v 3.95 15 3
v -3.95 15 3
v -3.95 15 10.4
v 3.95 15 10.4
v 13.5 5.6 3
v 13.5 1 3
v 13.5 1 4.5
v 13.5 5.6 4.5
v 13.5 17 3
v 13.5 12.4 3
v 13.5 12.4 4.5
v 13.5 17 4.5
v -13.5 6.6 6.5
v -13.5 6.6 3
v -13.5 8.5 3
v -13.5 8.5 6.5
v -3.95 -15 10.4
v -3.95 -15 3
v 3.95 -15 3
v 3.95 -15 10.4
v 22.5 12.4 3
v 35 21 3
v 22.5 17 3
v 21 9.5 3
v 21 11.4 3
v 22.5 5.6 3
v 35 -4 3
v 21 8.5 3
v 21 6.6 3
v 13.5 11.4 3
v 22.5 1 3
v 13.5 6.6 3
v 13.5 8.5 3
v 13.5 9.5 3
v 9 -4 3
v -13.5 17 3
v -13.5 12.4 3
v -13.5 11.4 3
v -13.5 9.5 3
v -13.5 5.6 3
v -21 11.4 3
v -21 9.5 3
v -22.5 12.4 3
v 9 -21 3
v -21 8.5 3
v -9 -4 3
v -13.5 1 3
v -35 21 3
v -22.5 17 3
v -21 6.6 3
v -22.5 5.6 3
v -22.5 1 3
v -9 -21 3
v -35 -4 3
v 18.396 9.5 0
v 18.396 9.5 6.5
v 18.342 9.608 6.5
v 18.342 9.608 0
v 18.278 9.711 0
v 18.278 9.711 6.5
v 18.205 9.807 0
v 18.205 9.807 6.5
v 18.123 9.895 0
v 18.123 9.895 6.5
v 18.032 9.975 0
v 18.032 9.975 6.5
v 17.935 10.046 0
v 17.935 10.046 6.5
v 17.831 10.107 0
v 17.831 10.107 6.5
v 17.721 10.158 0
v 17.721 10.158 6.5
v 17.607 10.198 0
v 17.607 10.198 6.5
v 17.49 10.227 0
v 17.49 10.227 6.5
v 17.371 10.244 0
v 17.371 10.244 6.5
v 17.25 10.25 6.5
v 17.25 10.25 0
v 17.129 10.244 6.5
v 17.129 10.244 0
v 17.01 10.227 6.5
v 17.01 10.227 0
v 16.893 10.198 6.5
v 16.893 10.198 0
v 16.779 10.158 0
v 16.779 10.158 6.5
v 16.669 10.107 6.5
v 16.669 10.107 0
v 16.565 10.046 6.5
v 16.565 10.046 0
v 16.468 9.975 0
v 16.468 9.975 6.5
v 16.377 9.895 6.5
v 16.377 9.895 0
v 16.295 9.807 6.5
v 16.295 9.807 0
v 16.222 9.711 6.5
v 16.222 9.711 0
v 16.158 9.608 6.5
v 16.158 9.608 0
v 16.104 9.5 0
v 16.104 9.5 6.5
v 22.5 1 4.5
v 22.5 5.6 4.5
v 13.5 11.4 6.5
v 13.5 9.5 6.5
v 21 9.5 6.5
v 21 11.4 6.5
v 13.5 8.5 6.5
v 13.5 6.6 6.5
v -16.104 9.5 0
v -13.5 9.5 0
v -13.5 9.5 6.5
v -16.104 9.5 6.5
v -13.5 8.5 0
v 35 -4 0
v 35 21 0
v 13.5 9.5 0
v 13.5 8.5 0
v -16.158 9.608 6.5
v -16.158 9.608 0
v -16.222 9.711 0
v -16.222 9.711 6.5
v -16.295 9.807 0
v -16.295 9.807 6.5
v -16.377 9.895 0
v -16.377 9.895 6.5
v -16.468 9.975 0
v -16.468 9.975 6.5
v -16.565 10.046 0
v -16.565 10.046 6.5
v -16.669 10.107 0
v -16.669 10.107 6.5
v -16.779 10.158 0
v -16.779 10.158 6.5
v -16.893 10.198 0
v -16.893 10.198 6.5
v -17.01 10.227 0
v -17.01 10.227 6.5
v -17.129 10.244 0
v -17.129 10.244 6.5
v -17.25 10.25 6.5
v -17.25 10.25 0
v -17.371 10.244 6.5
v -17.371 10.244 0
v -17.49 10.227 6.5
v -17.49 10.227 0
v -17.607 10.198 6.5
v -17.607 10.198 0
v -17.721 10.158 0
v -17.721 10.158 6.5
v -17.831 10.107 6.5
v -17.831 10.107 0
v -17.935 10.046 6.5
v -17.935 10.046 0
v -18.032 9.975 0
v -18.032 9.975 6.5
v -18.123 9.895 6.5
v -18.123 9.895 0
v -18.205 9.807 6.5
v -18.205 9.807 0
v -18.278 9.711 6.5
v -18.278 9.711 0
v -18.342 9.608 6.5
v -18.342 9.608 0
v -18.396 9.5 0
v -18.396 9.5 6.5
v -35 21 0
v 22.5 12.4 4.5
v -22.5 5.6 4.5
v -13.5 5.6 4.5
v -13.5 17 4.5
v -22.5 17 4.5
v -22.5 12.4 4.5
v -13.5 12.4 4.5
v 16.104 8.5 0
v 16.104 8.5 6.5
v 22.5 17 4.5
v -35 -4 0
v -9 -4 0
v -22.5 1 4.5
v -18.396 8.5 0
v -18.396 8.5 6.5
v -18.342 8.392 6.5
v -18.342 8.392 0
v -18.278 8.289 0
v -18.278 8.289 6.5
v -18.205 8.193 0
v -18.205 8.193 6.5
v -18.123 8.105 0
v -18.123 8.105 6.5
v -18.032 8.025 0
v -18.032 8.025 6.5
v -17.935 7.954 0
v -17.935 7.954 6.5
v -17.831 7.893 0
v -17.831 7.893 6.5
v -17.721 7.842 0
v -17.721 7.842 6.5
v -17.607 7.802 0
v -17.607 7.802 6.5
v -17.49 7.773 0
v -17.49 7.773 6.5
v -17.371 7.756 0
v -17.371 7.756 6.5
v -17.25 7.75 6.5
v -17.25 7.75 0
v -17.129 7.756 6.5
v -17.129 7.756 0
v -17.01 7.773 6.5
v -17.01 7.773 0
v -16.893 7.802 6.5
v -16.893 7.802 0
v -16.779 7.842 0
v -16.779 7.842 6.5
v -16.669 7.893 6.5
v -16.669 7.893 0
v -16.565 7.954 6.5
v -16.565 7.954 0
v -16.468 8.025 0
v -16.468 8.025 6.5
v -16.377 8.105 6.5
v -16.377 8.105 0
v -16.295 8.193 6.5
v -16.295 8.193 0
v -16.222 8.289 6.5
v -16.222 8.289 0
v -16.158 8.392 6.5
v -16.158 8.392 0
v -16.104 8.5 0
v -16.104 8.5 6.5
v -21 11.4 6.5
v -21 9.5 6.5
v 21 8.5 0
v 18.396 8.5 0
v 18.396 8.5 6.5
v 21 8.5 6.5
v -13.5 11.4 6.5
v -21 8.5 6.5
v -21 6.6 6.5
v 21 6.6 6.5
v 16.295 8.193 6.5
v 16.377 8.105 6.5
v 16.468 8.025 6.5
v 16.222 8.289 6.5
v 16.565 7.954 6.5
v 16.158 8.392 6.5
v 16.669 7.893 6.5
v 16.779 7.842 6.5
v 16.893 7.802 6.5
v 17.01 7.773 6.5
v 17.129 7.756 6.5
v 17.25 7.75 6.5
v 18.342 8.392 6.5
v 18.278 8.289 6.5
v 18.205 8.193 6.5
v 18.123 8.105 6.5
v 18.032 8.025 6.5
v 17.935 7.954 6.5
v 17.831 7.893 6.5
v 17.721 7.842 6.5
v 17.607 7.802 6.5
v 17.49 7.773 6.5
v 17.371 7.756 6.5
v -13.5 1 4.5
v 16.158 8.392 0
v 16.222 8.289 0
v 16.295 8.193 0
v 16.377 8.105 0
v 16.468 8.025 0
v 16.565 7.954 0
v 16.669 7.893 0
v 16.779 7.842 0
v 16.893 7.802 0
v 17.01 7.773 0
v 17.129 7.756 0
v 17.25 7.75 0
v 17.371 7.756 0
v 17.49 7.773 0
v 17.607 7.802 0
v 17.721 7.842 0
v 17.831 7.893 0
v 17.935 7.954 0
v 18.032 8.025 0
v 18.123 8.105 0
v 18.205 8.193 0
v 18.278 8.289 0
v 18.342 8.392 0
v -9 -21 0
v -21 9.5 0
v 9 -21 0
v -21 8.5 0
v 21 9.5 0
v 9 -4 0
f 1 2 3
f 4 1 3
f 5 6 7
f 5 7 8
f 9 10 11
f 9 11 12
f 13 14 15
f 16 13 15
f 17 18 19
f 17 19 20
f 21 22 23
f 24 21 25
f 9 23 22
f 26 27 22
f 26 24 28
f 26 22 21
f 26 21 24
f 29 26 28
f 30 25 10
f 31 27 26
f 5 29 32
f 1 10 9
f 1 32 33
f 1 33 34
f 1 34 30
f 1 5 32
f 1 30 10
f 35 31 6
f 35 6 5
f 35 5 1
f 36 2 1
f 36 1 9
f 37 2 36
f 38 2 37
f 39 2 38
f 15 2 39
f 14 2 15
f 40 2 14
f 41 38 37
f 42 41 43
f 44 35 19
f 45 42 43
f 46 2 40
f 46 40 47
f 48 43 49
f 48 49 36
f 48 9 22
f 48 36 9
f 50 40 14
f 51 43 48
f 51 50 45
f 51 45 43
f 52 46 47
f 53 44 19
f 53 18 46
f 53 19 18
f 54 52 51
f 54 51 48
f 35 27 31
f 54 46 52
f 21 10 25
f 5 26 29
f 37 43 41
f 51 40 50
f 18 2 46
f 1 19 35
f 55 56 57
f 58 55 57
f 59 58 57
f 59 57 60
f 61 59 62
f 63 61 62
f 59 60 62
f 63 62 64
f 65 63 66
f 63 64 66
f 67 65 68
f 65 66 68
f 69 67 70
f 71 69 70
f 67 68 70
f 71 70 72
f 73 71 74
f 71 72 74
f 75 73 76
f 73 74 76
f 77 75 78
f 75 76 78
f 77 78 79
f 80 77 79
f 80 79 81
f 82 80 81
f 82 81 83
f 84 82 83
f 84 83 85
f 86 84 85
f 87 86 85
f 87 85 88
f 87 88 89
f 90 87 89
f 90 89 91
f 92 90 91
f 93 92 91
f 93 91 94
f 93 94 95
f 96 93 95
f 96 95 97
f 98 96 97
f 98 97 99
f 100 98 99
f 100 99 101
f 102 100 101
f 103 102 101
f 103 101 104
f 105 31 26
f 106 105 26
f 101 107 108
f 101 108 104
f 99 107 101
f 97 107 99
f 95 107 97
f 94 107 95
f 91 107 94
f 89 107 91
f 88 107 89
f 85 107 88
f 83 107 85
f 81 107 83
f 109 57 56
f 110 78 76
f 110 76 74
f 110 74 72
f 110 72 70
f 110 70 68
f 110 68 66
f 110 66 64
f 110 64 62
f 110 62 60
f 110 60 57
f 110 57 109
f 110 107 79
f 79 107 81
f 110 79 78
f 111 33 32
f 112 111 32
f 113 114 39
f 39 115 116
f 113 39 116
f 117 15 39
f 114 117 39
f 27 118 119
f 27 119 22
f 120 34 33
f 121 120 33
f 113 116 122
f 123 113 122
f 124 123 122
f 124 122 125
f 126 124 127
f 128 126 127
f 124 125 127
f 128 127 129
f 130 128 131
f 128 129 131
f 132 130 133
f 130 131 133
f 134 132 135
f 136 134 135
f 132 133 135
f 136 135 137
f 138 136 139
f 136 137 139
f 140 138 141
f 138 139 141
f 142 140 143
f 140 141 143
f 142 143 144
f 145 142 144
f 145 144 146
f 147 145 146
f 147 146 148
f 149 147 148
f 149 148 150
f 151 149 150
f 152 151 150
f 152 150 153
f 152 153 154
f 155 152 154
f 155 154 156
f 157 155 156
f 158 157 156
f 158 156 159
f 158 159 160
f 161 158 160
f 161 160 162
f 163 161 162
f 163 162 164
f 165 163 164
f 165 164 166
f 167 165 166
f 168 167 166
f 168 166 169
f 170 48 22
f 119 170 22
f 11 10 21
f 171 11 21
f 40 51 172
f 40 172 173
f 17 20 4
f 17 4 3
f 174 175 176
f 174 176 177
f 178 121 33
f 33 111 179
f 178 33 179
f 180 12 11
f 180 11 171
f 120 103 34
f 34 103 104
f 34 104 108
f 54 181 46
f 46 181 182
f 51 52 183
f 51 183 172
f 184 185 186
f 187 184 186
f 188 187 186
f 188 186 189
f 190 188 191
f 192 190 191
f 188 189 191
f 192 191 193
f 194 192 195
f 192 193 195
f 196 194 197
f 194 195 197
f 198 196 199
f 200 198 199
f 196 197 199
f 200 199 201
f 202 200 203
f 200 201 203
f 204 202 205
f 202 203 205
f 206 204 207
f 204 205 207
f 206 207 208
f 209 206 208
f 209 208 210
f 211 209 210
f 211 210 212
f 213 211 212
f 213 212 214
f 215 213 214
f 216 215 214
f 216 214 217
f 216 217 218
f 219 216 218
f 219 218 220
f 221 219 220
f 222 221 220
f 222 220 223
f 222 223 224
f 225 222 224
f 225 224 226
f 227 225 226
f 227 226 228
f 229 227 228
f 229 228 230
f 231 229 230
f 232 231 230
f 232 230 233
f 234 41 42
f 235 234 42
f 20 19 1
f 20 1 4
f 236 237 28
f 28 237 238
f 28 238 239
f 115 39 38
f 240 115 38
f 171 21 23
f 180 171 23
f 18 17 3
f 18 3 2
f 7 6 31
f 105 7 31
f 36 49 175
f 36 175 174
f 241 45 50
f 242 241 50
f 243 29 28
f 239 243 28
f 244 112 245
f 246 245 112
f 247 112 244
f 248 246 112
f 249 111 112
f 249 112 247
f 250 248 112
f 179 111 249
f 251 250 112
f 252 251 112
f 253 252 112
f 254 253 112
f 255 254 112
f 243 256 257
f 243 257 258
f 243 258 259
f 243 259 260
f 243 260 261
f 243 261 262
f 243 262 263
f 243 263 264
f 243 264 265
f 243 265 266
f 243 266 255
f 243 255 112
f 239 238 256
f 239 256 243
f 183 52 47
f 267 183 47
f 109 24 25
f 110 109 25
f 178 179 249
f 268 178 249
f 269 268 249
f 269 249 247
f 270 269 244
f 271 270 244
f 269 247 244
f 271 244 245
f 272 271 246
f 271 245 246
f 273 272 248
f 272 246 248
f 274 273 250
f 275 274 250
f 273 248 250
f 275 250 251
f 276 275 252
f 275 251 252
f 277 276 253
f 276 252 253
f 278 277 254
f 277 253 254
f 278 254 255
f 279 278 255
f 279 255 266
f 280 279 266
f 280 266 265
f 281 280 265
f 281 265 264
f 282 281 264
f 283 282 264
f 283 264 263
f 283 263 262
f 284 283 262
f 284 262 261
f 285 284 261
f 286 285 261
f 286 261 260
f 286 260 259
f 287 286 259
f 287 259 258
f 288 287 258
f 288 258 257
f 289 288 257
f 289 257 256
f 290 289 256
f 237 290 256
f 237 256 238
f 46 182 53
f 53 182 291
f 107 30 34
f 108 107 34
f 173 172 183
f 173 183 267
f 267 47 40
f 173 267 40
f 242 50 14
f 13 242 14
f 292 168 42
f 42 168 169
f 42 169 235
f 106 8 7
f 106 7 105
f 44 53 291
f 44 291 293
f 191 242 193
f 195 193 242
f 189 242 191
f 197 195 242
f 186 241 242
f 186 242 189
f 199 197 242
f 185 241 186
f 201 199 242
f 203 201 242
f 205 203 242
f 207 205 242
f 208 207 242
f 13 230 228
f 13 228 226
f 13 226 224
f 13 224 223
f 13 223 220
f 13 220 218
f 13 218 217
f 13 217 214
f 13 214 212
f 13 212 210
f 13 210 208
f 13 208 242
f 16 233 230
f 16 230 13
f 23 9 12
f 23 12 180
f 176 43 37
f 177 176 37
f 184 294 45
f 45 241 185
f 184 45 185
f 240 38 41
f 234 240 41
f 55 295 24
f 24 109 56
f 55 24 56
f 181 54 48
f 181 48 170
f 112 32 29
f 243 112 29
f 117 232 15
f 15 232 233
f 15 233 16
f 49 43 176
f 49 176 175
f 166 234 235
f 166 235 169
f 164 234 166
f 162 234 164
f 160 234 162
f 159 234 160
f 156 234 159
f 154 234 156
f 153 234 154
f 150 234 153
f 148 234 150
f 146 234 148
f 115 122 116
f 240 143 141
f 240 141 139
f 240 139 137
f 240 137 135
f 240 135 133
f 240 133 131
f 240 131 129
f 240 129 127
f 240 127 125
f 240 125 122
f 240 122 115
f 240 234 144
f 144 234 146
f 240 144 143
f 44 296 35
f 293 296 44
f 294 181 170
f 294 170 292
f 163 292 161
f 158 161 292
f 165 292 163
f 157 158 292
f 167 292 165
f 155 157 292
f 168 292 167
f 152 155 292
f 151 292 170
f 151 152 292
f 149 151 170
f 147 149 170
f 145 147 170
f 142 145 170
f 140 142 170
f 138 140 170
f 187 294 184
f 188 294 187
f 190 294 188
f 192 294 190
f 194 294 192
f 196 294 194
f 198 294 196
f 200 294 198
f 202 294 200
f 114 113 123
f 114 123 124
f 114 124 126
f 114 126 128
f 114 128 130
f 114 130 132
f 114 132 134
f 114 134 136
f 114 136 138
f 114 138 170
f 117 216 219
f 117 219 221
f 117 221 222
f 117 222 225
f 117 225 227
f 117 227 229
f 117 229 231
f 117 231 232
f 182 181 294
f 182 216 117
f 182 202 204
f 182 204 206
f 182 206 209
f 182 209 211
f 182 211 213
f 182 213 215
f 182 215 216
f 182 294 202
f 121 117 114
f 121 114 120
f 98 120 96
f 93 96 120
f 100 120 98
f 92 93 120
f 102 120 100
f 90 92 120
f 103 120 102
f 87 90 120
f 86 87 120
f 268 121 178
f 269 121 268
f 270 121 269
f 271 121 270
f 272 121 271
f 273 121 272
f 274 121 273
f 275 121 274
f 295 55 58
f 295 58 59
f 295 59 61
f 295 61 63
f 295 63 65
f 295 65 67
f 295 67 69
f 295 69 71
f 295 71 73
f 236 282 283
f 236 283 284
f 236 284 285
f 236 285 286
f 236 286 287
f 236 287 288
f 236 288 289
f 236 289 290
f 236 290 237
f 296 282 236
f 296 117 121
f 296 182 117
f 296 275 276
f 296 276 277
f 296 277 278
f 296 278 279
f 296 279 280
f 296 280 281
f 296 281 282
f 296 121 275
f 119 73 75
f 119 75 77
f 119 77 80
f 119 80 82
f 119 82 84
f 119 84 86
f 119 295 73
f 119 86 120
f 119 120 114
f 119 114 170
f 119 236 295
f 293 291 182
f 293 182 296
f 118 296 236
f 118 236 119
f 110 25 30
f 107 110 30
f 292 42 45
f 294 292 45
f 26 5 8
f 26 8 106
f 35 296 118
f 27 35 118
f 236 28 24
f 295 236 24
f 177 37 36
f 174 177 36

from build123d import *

# Parameters (mm, degrees)
F1_DEPTH = 21
F2_W     = 26
F2_H     = 17
F3_DEPTH = 25
F4_W     = 6
F4_H     = 7.4
F5_DEPTH = 25
F6_W     = 9
F6_H     = 4.6
F7_DEPTH = 1.5
F8_DEPTH = 3.5
F9_DEPTH = 3.001


with BuildPart() as f1:
    # F0 (on Front) → F1 (new body, symmetric)
    with BuildSketch(Plane.XZ):
        Polygon((-35, 0), (35, 0), (35, 3), (3.95, 3), (3.95, 10.4), (0, 10.4), (-3.95, 10.4), (-3.95, 3), (-35, 3), align=None)
    extrude(amount=F1_DEPTH, both=True)

    # F2 (on face) → F3 (cut)
    with BuildSketch(Plane(origin=(0, 0, 0), x_dir=(1, 0, 0), z_dir=(0, 0, -1))):
        with Locations((-22, 12.5)):
            Rectangle(F2_W, F2_H)
        with Locations((22, 12.5)):
            Rectangle(F2_W, F2_H)
    extrude(amount=-F3_DEPTH, mode=Mode.SUBTRACT)

    # F4 (on face) → F5 (cut)
    with BuildSketch(Plane(origin=(-3.95, 0, 0), x_dir=(0, -1, 0), z_dir=(-1, 0, 0))):
        with Locations((-18, 6.7)):
            Rectangle(F4_W, F4_H)
        with Locations((18, 6.7)):
            Rectangle(F4_W, F4_H)
    extrude(amount=-F5_DEPTH, mode=Mode.SUBTRACT)

    # F6 (on face) → F7 (join)
    with BuildSketch(Plane.XY.offset(3)):
        with Locations((-18, 14.7)):
            Rectangle(F6_W, F6_H)
        with Locations((-18, 3.3)):
            Rectangle(F6_W, F6_H)
        with Locations((18, 14.7)):
            Rectangle(F6_W, F6_H)
        with Locations((18, 3.3)):
            Rectangle(F6_W, F6_H)
    extrude(amount=F7_DEPTH)

    # F6 (on face) → F8 (join)
    with BuildSketch(Plane.XY.offset(3)):
        with BuildLine():
            Line((-13.5, 9.5), (-13.5, 11.4))
            Line((-13.5, 11.4), (-21, 11.4))
            Line((-21, 11.4), (-21, 9.5))
            Line((-21, 9.5), (-18.3956439237, 9.5))
            ThreePointArc((-18.3956439237, 9.5), (-17.25, 10.25), (-16.1043560763, 9.5))
            Line((-16.1043560763, 9.5), (-13.5, 9.5))
        make_face()
        with BuildLine():
            Line((-13.5, 6.6), (-13.5, 8.5))
            Line((-13.5, 8.5), (-16.1043560763, 8.5))
            ThreePointArc((-16.1043560763, 8.5), (-17.25, 7.75), (-18.3956439237, 8.5))
            Line((-18.3956439237, 8.5), (-21, 8.5))
            Line((-21, 8.5), (-21, 6.6))
            Line((-21, 6.6), (-13.5, 6.6))
        make_face()
        with BuildLine():
            Line((21, 11.4), (13.5, 11.4))
            Line((13.5, 11.4), (13.5, 9.5))
            Line((13.5, 9.5), (16.1043560763, 9.5))
            ThreePointArc((16.1043560763, 9.5), (17.25, 10.25), (18.3956439237, 9.5))
            Line((18.3956439237, 9.5), (21, 9.5))
            Line((21, 9.5), (21, 11.4))
        make_face()
        with BuildLine():
            Line((13.5, 8.5), (13.5, 6.6))
            Line((13.5, 6.6), (21, 6.6))
            Line((21, 6.6), (21, 8.5))
            Line((21, 8.5), (18.3956439237, 8.5))
            ThreePointArc((18.3956439237, 8.5), (17.25, 7.75), (16.1043560763, 8.5))
            Line((16.1043560763, 8.5), (13.5, 8.5))
        make_face()
    extrude(amount=F8_DEPTH)

    # F6 (on face) → F9 (cut, through all)
    with BuildSketch(Plane.XY.offset(3)):
        with BuildLine():
            Line((-13.5, 8.5), (-13.5, 9.5))
            Line((-13.5, 9.5), (-16.1043560763, 9.5))
            ThreePointArc((-16.1043560763, 9.5), (-16.0263671088, 9.2553870546), (-16, 9))
            ThreePointArc((-16, 9), (-16.0263671088, 8.7446129454), (-16.1043560763, 8.5))
            Line((-16.1043560763, 8.5), (-13.5, 8.5))
        make_face()
        with BuildLine():
            ThreePointArc((-16, 9), (-16.0263671088, 9.2553870546), (-16.1043560763, 9.5))
            Line((-16.1043560763, 9.5), (-18.3956439237, 9.5))
            ThreePointArc((-18.3956439237, 9.5), (-18.5, 9), (-18.3956439237, 8.5))
            Line((-18.3956439237, 8.5), (-16.1043560763, 8.5))
            ThreePointArc((-16.1043560763, 8.5), (-16.0263671088, 8.7446129454), (-16, 9))
        make_face()
        with BuildLine():
            Line((-18.3956439237, 9.5), (-21, 9.5))
            Line((-21, 9.5), (-21, 8.5))
            Line((-21, 8.5), (-18.3956439237, 8.5))
            ThreePointArc((-18.3956439237, 8.5), (-18.5, 9), (-18.3956439237, 9.5))
        make_face()
        with BuildLine():
            Line((16.1043560763, 9.5), (13.5, 9.5))
            Line((13.5, 9.5), (13.5, 8.5))
            Line((13.5, 8.5), (16.1043560763, 8.5))
            ThreePointArc((16.1043560763, 8.5), (16, 9), (16.1043560763, 9.5))
        make_face()
        with BuildLine():
            Line((18.3956439237, 9.5), (16.1043560763, 9.5))
            ThreePointArc((16.1043560763, 9.5), (16, 9), (16.1043560763, 8.5))
            Line((16.1043560763, 8.5), (18.3956439237, 8.5))
            ThreePointArc((18.3956439237, 8.5), (18.4736328912, 8.7446129454), (18.5, 9))
            ThreePointArc((18.5, 9), (18.4736328912, 9.2553870546), (18.3956439237, 9.5))
        make_face()
        with BuildLine():
            Line((21, 8.5), (21, 9.5))
            Line((21, 9.5), (18.3956439237, 9.5))
            ThreePointArc((18.3956439237, 9.5), (18.4736328912, 9.2553870546), (18.5, 9))
            ThreePointArc((18.5, 9), (18.4736328912, 8.7446129454), (18.3956439237, 8.5))
            Line((18.3956439237, 8.5), (21, 8.5))
        make_face()
        with BuildLine():
            Line((-18.3956439237, 9.5), (-16.1043560763, 9.5))
            ThreePointArc((-16.1043560763, 9.5), (-17.25, 10.25), (-18.3956439237, 9.5))
        make_face()
        with BuildLine():
            ThreePointArc((-18.3956439237, 8.5), (-17.25, 7.75), (-16.1043560763, 8.5))
            Line((-16.1043560763, 8.5), (-18.3956439237, 8.5))
        make_face()
        with BuildLine():
            ThreePointArc((18.3956439237, 9.5), (17.25, 10.25), (16.1043560763, 9.5))
            Line((16.1043560763, 9.5), (18.3956439237, 9.5))
        make_face()
        with BuildLine():
            Line((18.3956439237, 8.5), (16.1043560763, 8.5))
            ThreePointArc((16.1043560763, 8.5), (17.25, 7.75), (18.3956439237, 8.5))
        make_face()
    extrude(amount=-F9_DEPTH, mode=Mode.SUBTRACT)


solid = f1.part
